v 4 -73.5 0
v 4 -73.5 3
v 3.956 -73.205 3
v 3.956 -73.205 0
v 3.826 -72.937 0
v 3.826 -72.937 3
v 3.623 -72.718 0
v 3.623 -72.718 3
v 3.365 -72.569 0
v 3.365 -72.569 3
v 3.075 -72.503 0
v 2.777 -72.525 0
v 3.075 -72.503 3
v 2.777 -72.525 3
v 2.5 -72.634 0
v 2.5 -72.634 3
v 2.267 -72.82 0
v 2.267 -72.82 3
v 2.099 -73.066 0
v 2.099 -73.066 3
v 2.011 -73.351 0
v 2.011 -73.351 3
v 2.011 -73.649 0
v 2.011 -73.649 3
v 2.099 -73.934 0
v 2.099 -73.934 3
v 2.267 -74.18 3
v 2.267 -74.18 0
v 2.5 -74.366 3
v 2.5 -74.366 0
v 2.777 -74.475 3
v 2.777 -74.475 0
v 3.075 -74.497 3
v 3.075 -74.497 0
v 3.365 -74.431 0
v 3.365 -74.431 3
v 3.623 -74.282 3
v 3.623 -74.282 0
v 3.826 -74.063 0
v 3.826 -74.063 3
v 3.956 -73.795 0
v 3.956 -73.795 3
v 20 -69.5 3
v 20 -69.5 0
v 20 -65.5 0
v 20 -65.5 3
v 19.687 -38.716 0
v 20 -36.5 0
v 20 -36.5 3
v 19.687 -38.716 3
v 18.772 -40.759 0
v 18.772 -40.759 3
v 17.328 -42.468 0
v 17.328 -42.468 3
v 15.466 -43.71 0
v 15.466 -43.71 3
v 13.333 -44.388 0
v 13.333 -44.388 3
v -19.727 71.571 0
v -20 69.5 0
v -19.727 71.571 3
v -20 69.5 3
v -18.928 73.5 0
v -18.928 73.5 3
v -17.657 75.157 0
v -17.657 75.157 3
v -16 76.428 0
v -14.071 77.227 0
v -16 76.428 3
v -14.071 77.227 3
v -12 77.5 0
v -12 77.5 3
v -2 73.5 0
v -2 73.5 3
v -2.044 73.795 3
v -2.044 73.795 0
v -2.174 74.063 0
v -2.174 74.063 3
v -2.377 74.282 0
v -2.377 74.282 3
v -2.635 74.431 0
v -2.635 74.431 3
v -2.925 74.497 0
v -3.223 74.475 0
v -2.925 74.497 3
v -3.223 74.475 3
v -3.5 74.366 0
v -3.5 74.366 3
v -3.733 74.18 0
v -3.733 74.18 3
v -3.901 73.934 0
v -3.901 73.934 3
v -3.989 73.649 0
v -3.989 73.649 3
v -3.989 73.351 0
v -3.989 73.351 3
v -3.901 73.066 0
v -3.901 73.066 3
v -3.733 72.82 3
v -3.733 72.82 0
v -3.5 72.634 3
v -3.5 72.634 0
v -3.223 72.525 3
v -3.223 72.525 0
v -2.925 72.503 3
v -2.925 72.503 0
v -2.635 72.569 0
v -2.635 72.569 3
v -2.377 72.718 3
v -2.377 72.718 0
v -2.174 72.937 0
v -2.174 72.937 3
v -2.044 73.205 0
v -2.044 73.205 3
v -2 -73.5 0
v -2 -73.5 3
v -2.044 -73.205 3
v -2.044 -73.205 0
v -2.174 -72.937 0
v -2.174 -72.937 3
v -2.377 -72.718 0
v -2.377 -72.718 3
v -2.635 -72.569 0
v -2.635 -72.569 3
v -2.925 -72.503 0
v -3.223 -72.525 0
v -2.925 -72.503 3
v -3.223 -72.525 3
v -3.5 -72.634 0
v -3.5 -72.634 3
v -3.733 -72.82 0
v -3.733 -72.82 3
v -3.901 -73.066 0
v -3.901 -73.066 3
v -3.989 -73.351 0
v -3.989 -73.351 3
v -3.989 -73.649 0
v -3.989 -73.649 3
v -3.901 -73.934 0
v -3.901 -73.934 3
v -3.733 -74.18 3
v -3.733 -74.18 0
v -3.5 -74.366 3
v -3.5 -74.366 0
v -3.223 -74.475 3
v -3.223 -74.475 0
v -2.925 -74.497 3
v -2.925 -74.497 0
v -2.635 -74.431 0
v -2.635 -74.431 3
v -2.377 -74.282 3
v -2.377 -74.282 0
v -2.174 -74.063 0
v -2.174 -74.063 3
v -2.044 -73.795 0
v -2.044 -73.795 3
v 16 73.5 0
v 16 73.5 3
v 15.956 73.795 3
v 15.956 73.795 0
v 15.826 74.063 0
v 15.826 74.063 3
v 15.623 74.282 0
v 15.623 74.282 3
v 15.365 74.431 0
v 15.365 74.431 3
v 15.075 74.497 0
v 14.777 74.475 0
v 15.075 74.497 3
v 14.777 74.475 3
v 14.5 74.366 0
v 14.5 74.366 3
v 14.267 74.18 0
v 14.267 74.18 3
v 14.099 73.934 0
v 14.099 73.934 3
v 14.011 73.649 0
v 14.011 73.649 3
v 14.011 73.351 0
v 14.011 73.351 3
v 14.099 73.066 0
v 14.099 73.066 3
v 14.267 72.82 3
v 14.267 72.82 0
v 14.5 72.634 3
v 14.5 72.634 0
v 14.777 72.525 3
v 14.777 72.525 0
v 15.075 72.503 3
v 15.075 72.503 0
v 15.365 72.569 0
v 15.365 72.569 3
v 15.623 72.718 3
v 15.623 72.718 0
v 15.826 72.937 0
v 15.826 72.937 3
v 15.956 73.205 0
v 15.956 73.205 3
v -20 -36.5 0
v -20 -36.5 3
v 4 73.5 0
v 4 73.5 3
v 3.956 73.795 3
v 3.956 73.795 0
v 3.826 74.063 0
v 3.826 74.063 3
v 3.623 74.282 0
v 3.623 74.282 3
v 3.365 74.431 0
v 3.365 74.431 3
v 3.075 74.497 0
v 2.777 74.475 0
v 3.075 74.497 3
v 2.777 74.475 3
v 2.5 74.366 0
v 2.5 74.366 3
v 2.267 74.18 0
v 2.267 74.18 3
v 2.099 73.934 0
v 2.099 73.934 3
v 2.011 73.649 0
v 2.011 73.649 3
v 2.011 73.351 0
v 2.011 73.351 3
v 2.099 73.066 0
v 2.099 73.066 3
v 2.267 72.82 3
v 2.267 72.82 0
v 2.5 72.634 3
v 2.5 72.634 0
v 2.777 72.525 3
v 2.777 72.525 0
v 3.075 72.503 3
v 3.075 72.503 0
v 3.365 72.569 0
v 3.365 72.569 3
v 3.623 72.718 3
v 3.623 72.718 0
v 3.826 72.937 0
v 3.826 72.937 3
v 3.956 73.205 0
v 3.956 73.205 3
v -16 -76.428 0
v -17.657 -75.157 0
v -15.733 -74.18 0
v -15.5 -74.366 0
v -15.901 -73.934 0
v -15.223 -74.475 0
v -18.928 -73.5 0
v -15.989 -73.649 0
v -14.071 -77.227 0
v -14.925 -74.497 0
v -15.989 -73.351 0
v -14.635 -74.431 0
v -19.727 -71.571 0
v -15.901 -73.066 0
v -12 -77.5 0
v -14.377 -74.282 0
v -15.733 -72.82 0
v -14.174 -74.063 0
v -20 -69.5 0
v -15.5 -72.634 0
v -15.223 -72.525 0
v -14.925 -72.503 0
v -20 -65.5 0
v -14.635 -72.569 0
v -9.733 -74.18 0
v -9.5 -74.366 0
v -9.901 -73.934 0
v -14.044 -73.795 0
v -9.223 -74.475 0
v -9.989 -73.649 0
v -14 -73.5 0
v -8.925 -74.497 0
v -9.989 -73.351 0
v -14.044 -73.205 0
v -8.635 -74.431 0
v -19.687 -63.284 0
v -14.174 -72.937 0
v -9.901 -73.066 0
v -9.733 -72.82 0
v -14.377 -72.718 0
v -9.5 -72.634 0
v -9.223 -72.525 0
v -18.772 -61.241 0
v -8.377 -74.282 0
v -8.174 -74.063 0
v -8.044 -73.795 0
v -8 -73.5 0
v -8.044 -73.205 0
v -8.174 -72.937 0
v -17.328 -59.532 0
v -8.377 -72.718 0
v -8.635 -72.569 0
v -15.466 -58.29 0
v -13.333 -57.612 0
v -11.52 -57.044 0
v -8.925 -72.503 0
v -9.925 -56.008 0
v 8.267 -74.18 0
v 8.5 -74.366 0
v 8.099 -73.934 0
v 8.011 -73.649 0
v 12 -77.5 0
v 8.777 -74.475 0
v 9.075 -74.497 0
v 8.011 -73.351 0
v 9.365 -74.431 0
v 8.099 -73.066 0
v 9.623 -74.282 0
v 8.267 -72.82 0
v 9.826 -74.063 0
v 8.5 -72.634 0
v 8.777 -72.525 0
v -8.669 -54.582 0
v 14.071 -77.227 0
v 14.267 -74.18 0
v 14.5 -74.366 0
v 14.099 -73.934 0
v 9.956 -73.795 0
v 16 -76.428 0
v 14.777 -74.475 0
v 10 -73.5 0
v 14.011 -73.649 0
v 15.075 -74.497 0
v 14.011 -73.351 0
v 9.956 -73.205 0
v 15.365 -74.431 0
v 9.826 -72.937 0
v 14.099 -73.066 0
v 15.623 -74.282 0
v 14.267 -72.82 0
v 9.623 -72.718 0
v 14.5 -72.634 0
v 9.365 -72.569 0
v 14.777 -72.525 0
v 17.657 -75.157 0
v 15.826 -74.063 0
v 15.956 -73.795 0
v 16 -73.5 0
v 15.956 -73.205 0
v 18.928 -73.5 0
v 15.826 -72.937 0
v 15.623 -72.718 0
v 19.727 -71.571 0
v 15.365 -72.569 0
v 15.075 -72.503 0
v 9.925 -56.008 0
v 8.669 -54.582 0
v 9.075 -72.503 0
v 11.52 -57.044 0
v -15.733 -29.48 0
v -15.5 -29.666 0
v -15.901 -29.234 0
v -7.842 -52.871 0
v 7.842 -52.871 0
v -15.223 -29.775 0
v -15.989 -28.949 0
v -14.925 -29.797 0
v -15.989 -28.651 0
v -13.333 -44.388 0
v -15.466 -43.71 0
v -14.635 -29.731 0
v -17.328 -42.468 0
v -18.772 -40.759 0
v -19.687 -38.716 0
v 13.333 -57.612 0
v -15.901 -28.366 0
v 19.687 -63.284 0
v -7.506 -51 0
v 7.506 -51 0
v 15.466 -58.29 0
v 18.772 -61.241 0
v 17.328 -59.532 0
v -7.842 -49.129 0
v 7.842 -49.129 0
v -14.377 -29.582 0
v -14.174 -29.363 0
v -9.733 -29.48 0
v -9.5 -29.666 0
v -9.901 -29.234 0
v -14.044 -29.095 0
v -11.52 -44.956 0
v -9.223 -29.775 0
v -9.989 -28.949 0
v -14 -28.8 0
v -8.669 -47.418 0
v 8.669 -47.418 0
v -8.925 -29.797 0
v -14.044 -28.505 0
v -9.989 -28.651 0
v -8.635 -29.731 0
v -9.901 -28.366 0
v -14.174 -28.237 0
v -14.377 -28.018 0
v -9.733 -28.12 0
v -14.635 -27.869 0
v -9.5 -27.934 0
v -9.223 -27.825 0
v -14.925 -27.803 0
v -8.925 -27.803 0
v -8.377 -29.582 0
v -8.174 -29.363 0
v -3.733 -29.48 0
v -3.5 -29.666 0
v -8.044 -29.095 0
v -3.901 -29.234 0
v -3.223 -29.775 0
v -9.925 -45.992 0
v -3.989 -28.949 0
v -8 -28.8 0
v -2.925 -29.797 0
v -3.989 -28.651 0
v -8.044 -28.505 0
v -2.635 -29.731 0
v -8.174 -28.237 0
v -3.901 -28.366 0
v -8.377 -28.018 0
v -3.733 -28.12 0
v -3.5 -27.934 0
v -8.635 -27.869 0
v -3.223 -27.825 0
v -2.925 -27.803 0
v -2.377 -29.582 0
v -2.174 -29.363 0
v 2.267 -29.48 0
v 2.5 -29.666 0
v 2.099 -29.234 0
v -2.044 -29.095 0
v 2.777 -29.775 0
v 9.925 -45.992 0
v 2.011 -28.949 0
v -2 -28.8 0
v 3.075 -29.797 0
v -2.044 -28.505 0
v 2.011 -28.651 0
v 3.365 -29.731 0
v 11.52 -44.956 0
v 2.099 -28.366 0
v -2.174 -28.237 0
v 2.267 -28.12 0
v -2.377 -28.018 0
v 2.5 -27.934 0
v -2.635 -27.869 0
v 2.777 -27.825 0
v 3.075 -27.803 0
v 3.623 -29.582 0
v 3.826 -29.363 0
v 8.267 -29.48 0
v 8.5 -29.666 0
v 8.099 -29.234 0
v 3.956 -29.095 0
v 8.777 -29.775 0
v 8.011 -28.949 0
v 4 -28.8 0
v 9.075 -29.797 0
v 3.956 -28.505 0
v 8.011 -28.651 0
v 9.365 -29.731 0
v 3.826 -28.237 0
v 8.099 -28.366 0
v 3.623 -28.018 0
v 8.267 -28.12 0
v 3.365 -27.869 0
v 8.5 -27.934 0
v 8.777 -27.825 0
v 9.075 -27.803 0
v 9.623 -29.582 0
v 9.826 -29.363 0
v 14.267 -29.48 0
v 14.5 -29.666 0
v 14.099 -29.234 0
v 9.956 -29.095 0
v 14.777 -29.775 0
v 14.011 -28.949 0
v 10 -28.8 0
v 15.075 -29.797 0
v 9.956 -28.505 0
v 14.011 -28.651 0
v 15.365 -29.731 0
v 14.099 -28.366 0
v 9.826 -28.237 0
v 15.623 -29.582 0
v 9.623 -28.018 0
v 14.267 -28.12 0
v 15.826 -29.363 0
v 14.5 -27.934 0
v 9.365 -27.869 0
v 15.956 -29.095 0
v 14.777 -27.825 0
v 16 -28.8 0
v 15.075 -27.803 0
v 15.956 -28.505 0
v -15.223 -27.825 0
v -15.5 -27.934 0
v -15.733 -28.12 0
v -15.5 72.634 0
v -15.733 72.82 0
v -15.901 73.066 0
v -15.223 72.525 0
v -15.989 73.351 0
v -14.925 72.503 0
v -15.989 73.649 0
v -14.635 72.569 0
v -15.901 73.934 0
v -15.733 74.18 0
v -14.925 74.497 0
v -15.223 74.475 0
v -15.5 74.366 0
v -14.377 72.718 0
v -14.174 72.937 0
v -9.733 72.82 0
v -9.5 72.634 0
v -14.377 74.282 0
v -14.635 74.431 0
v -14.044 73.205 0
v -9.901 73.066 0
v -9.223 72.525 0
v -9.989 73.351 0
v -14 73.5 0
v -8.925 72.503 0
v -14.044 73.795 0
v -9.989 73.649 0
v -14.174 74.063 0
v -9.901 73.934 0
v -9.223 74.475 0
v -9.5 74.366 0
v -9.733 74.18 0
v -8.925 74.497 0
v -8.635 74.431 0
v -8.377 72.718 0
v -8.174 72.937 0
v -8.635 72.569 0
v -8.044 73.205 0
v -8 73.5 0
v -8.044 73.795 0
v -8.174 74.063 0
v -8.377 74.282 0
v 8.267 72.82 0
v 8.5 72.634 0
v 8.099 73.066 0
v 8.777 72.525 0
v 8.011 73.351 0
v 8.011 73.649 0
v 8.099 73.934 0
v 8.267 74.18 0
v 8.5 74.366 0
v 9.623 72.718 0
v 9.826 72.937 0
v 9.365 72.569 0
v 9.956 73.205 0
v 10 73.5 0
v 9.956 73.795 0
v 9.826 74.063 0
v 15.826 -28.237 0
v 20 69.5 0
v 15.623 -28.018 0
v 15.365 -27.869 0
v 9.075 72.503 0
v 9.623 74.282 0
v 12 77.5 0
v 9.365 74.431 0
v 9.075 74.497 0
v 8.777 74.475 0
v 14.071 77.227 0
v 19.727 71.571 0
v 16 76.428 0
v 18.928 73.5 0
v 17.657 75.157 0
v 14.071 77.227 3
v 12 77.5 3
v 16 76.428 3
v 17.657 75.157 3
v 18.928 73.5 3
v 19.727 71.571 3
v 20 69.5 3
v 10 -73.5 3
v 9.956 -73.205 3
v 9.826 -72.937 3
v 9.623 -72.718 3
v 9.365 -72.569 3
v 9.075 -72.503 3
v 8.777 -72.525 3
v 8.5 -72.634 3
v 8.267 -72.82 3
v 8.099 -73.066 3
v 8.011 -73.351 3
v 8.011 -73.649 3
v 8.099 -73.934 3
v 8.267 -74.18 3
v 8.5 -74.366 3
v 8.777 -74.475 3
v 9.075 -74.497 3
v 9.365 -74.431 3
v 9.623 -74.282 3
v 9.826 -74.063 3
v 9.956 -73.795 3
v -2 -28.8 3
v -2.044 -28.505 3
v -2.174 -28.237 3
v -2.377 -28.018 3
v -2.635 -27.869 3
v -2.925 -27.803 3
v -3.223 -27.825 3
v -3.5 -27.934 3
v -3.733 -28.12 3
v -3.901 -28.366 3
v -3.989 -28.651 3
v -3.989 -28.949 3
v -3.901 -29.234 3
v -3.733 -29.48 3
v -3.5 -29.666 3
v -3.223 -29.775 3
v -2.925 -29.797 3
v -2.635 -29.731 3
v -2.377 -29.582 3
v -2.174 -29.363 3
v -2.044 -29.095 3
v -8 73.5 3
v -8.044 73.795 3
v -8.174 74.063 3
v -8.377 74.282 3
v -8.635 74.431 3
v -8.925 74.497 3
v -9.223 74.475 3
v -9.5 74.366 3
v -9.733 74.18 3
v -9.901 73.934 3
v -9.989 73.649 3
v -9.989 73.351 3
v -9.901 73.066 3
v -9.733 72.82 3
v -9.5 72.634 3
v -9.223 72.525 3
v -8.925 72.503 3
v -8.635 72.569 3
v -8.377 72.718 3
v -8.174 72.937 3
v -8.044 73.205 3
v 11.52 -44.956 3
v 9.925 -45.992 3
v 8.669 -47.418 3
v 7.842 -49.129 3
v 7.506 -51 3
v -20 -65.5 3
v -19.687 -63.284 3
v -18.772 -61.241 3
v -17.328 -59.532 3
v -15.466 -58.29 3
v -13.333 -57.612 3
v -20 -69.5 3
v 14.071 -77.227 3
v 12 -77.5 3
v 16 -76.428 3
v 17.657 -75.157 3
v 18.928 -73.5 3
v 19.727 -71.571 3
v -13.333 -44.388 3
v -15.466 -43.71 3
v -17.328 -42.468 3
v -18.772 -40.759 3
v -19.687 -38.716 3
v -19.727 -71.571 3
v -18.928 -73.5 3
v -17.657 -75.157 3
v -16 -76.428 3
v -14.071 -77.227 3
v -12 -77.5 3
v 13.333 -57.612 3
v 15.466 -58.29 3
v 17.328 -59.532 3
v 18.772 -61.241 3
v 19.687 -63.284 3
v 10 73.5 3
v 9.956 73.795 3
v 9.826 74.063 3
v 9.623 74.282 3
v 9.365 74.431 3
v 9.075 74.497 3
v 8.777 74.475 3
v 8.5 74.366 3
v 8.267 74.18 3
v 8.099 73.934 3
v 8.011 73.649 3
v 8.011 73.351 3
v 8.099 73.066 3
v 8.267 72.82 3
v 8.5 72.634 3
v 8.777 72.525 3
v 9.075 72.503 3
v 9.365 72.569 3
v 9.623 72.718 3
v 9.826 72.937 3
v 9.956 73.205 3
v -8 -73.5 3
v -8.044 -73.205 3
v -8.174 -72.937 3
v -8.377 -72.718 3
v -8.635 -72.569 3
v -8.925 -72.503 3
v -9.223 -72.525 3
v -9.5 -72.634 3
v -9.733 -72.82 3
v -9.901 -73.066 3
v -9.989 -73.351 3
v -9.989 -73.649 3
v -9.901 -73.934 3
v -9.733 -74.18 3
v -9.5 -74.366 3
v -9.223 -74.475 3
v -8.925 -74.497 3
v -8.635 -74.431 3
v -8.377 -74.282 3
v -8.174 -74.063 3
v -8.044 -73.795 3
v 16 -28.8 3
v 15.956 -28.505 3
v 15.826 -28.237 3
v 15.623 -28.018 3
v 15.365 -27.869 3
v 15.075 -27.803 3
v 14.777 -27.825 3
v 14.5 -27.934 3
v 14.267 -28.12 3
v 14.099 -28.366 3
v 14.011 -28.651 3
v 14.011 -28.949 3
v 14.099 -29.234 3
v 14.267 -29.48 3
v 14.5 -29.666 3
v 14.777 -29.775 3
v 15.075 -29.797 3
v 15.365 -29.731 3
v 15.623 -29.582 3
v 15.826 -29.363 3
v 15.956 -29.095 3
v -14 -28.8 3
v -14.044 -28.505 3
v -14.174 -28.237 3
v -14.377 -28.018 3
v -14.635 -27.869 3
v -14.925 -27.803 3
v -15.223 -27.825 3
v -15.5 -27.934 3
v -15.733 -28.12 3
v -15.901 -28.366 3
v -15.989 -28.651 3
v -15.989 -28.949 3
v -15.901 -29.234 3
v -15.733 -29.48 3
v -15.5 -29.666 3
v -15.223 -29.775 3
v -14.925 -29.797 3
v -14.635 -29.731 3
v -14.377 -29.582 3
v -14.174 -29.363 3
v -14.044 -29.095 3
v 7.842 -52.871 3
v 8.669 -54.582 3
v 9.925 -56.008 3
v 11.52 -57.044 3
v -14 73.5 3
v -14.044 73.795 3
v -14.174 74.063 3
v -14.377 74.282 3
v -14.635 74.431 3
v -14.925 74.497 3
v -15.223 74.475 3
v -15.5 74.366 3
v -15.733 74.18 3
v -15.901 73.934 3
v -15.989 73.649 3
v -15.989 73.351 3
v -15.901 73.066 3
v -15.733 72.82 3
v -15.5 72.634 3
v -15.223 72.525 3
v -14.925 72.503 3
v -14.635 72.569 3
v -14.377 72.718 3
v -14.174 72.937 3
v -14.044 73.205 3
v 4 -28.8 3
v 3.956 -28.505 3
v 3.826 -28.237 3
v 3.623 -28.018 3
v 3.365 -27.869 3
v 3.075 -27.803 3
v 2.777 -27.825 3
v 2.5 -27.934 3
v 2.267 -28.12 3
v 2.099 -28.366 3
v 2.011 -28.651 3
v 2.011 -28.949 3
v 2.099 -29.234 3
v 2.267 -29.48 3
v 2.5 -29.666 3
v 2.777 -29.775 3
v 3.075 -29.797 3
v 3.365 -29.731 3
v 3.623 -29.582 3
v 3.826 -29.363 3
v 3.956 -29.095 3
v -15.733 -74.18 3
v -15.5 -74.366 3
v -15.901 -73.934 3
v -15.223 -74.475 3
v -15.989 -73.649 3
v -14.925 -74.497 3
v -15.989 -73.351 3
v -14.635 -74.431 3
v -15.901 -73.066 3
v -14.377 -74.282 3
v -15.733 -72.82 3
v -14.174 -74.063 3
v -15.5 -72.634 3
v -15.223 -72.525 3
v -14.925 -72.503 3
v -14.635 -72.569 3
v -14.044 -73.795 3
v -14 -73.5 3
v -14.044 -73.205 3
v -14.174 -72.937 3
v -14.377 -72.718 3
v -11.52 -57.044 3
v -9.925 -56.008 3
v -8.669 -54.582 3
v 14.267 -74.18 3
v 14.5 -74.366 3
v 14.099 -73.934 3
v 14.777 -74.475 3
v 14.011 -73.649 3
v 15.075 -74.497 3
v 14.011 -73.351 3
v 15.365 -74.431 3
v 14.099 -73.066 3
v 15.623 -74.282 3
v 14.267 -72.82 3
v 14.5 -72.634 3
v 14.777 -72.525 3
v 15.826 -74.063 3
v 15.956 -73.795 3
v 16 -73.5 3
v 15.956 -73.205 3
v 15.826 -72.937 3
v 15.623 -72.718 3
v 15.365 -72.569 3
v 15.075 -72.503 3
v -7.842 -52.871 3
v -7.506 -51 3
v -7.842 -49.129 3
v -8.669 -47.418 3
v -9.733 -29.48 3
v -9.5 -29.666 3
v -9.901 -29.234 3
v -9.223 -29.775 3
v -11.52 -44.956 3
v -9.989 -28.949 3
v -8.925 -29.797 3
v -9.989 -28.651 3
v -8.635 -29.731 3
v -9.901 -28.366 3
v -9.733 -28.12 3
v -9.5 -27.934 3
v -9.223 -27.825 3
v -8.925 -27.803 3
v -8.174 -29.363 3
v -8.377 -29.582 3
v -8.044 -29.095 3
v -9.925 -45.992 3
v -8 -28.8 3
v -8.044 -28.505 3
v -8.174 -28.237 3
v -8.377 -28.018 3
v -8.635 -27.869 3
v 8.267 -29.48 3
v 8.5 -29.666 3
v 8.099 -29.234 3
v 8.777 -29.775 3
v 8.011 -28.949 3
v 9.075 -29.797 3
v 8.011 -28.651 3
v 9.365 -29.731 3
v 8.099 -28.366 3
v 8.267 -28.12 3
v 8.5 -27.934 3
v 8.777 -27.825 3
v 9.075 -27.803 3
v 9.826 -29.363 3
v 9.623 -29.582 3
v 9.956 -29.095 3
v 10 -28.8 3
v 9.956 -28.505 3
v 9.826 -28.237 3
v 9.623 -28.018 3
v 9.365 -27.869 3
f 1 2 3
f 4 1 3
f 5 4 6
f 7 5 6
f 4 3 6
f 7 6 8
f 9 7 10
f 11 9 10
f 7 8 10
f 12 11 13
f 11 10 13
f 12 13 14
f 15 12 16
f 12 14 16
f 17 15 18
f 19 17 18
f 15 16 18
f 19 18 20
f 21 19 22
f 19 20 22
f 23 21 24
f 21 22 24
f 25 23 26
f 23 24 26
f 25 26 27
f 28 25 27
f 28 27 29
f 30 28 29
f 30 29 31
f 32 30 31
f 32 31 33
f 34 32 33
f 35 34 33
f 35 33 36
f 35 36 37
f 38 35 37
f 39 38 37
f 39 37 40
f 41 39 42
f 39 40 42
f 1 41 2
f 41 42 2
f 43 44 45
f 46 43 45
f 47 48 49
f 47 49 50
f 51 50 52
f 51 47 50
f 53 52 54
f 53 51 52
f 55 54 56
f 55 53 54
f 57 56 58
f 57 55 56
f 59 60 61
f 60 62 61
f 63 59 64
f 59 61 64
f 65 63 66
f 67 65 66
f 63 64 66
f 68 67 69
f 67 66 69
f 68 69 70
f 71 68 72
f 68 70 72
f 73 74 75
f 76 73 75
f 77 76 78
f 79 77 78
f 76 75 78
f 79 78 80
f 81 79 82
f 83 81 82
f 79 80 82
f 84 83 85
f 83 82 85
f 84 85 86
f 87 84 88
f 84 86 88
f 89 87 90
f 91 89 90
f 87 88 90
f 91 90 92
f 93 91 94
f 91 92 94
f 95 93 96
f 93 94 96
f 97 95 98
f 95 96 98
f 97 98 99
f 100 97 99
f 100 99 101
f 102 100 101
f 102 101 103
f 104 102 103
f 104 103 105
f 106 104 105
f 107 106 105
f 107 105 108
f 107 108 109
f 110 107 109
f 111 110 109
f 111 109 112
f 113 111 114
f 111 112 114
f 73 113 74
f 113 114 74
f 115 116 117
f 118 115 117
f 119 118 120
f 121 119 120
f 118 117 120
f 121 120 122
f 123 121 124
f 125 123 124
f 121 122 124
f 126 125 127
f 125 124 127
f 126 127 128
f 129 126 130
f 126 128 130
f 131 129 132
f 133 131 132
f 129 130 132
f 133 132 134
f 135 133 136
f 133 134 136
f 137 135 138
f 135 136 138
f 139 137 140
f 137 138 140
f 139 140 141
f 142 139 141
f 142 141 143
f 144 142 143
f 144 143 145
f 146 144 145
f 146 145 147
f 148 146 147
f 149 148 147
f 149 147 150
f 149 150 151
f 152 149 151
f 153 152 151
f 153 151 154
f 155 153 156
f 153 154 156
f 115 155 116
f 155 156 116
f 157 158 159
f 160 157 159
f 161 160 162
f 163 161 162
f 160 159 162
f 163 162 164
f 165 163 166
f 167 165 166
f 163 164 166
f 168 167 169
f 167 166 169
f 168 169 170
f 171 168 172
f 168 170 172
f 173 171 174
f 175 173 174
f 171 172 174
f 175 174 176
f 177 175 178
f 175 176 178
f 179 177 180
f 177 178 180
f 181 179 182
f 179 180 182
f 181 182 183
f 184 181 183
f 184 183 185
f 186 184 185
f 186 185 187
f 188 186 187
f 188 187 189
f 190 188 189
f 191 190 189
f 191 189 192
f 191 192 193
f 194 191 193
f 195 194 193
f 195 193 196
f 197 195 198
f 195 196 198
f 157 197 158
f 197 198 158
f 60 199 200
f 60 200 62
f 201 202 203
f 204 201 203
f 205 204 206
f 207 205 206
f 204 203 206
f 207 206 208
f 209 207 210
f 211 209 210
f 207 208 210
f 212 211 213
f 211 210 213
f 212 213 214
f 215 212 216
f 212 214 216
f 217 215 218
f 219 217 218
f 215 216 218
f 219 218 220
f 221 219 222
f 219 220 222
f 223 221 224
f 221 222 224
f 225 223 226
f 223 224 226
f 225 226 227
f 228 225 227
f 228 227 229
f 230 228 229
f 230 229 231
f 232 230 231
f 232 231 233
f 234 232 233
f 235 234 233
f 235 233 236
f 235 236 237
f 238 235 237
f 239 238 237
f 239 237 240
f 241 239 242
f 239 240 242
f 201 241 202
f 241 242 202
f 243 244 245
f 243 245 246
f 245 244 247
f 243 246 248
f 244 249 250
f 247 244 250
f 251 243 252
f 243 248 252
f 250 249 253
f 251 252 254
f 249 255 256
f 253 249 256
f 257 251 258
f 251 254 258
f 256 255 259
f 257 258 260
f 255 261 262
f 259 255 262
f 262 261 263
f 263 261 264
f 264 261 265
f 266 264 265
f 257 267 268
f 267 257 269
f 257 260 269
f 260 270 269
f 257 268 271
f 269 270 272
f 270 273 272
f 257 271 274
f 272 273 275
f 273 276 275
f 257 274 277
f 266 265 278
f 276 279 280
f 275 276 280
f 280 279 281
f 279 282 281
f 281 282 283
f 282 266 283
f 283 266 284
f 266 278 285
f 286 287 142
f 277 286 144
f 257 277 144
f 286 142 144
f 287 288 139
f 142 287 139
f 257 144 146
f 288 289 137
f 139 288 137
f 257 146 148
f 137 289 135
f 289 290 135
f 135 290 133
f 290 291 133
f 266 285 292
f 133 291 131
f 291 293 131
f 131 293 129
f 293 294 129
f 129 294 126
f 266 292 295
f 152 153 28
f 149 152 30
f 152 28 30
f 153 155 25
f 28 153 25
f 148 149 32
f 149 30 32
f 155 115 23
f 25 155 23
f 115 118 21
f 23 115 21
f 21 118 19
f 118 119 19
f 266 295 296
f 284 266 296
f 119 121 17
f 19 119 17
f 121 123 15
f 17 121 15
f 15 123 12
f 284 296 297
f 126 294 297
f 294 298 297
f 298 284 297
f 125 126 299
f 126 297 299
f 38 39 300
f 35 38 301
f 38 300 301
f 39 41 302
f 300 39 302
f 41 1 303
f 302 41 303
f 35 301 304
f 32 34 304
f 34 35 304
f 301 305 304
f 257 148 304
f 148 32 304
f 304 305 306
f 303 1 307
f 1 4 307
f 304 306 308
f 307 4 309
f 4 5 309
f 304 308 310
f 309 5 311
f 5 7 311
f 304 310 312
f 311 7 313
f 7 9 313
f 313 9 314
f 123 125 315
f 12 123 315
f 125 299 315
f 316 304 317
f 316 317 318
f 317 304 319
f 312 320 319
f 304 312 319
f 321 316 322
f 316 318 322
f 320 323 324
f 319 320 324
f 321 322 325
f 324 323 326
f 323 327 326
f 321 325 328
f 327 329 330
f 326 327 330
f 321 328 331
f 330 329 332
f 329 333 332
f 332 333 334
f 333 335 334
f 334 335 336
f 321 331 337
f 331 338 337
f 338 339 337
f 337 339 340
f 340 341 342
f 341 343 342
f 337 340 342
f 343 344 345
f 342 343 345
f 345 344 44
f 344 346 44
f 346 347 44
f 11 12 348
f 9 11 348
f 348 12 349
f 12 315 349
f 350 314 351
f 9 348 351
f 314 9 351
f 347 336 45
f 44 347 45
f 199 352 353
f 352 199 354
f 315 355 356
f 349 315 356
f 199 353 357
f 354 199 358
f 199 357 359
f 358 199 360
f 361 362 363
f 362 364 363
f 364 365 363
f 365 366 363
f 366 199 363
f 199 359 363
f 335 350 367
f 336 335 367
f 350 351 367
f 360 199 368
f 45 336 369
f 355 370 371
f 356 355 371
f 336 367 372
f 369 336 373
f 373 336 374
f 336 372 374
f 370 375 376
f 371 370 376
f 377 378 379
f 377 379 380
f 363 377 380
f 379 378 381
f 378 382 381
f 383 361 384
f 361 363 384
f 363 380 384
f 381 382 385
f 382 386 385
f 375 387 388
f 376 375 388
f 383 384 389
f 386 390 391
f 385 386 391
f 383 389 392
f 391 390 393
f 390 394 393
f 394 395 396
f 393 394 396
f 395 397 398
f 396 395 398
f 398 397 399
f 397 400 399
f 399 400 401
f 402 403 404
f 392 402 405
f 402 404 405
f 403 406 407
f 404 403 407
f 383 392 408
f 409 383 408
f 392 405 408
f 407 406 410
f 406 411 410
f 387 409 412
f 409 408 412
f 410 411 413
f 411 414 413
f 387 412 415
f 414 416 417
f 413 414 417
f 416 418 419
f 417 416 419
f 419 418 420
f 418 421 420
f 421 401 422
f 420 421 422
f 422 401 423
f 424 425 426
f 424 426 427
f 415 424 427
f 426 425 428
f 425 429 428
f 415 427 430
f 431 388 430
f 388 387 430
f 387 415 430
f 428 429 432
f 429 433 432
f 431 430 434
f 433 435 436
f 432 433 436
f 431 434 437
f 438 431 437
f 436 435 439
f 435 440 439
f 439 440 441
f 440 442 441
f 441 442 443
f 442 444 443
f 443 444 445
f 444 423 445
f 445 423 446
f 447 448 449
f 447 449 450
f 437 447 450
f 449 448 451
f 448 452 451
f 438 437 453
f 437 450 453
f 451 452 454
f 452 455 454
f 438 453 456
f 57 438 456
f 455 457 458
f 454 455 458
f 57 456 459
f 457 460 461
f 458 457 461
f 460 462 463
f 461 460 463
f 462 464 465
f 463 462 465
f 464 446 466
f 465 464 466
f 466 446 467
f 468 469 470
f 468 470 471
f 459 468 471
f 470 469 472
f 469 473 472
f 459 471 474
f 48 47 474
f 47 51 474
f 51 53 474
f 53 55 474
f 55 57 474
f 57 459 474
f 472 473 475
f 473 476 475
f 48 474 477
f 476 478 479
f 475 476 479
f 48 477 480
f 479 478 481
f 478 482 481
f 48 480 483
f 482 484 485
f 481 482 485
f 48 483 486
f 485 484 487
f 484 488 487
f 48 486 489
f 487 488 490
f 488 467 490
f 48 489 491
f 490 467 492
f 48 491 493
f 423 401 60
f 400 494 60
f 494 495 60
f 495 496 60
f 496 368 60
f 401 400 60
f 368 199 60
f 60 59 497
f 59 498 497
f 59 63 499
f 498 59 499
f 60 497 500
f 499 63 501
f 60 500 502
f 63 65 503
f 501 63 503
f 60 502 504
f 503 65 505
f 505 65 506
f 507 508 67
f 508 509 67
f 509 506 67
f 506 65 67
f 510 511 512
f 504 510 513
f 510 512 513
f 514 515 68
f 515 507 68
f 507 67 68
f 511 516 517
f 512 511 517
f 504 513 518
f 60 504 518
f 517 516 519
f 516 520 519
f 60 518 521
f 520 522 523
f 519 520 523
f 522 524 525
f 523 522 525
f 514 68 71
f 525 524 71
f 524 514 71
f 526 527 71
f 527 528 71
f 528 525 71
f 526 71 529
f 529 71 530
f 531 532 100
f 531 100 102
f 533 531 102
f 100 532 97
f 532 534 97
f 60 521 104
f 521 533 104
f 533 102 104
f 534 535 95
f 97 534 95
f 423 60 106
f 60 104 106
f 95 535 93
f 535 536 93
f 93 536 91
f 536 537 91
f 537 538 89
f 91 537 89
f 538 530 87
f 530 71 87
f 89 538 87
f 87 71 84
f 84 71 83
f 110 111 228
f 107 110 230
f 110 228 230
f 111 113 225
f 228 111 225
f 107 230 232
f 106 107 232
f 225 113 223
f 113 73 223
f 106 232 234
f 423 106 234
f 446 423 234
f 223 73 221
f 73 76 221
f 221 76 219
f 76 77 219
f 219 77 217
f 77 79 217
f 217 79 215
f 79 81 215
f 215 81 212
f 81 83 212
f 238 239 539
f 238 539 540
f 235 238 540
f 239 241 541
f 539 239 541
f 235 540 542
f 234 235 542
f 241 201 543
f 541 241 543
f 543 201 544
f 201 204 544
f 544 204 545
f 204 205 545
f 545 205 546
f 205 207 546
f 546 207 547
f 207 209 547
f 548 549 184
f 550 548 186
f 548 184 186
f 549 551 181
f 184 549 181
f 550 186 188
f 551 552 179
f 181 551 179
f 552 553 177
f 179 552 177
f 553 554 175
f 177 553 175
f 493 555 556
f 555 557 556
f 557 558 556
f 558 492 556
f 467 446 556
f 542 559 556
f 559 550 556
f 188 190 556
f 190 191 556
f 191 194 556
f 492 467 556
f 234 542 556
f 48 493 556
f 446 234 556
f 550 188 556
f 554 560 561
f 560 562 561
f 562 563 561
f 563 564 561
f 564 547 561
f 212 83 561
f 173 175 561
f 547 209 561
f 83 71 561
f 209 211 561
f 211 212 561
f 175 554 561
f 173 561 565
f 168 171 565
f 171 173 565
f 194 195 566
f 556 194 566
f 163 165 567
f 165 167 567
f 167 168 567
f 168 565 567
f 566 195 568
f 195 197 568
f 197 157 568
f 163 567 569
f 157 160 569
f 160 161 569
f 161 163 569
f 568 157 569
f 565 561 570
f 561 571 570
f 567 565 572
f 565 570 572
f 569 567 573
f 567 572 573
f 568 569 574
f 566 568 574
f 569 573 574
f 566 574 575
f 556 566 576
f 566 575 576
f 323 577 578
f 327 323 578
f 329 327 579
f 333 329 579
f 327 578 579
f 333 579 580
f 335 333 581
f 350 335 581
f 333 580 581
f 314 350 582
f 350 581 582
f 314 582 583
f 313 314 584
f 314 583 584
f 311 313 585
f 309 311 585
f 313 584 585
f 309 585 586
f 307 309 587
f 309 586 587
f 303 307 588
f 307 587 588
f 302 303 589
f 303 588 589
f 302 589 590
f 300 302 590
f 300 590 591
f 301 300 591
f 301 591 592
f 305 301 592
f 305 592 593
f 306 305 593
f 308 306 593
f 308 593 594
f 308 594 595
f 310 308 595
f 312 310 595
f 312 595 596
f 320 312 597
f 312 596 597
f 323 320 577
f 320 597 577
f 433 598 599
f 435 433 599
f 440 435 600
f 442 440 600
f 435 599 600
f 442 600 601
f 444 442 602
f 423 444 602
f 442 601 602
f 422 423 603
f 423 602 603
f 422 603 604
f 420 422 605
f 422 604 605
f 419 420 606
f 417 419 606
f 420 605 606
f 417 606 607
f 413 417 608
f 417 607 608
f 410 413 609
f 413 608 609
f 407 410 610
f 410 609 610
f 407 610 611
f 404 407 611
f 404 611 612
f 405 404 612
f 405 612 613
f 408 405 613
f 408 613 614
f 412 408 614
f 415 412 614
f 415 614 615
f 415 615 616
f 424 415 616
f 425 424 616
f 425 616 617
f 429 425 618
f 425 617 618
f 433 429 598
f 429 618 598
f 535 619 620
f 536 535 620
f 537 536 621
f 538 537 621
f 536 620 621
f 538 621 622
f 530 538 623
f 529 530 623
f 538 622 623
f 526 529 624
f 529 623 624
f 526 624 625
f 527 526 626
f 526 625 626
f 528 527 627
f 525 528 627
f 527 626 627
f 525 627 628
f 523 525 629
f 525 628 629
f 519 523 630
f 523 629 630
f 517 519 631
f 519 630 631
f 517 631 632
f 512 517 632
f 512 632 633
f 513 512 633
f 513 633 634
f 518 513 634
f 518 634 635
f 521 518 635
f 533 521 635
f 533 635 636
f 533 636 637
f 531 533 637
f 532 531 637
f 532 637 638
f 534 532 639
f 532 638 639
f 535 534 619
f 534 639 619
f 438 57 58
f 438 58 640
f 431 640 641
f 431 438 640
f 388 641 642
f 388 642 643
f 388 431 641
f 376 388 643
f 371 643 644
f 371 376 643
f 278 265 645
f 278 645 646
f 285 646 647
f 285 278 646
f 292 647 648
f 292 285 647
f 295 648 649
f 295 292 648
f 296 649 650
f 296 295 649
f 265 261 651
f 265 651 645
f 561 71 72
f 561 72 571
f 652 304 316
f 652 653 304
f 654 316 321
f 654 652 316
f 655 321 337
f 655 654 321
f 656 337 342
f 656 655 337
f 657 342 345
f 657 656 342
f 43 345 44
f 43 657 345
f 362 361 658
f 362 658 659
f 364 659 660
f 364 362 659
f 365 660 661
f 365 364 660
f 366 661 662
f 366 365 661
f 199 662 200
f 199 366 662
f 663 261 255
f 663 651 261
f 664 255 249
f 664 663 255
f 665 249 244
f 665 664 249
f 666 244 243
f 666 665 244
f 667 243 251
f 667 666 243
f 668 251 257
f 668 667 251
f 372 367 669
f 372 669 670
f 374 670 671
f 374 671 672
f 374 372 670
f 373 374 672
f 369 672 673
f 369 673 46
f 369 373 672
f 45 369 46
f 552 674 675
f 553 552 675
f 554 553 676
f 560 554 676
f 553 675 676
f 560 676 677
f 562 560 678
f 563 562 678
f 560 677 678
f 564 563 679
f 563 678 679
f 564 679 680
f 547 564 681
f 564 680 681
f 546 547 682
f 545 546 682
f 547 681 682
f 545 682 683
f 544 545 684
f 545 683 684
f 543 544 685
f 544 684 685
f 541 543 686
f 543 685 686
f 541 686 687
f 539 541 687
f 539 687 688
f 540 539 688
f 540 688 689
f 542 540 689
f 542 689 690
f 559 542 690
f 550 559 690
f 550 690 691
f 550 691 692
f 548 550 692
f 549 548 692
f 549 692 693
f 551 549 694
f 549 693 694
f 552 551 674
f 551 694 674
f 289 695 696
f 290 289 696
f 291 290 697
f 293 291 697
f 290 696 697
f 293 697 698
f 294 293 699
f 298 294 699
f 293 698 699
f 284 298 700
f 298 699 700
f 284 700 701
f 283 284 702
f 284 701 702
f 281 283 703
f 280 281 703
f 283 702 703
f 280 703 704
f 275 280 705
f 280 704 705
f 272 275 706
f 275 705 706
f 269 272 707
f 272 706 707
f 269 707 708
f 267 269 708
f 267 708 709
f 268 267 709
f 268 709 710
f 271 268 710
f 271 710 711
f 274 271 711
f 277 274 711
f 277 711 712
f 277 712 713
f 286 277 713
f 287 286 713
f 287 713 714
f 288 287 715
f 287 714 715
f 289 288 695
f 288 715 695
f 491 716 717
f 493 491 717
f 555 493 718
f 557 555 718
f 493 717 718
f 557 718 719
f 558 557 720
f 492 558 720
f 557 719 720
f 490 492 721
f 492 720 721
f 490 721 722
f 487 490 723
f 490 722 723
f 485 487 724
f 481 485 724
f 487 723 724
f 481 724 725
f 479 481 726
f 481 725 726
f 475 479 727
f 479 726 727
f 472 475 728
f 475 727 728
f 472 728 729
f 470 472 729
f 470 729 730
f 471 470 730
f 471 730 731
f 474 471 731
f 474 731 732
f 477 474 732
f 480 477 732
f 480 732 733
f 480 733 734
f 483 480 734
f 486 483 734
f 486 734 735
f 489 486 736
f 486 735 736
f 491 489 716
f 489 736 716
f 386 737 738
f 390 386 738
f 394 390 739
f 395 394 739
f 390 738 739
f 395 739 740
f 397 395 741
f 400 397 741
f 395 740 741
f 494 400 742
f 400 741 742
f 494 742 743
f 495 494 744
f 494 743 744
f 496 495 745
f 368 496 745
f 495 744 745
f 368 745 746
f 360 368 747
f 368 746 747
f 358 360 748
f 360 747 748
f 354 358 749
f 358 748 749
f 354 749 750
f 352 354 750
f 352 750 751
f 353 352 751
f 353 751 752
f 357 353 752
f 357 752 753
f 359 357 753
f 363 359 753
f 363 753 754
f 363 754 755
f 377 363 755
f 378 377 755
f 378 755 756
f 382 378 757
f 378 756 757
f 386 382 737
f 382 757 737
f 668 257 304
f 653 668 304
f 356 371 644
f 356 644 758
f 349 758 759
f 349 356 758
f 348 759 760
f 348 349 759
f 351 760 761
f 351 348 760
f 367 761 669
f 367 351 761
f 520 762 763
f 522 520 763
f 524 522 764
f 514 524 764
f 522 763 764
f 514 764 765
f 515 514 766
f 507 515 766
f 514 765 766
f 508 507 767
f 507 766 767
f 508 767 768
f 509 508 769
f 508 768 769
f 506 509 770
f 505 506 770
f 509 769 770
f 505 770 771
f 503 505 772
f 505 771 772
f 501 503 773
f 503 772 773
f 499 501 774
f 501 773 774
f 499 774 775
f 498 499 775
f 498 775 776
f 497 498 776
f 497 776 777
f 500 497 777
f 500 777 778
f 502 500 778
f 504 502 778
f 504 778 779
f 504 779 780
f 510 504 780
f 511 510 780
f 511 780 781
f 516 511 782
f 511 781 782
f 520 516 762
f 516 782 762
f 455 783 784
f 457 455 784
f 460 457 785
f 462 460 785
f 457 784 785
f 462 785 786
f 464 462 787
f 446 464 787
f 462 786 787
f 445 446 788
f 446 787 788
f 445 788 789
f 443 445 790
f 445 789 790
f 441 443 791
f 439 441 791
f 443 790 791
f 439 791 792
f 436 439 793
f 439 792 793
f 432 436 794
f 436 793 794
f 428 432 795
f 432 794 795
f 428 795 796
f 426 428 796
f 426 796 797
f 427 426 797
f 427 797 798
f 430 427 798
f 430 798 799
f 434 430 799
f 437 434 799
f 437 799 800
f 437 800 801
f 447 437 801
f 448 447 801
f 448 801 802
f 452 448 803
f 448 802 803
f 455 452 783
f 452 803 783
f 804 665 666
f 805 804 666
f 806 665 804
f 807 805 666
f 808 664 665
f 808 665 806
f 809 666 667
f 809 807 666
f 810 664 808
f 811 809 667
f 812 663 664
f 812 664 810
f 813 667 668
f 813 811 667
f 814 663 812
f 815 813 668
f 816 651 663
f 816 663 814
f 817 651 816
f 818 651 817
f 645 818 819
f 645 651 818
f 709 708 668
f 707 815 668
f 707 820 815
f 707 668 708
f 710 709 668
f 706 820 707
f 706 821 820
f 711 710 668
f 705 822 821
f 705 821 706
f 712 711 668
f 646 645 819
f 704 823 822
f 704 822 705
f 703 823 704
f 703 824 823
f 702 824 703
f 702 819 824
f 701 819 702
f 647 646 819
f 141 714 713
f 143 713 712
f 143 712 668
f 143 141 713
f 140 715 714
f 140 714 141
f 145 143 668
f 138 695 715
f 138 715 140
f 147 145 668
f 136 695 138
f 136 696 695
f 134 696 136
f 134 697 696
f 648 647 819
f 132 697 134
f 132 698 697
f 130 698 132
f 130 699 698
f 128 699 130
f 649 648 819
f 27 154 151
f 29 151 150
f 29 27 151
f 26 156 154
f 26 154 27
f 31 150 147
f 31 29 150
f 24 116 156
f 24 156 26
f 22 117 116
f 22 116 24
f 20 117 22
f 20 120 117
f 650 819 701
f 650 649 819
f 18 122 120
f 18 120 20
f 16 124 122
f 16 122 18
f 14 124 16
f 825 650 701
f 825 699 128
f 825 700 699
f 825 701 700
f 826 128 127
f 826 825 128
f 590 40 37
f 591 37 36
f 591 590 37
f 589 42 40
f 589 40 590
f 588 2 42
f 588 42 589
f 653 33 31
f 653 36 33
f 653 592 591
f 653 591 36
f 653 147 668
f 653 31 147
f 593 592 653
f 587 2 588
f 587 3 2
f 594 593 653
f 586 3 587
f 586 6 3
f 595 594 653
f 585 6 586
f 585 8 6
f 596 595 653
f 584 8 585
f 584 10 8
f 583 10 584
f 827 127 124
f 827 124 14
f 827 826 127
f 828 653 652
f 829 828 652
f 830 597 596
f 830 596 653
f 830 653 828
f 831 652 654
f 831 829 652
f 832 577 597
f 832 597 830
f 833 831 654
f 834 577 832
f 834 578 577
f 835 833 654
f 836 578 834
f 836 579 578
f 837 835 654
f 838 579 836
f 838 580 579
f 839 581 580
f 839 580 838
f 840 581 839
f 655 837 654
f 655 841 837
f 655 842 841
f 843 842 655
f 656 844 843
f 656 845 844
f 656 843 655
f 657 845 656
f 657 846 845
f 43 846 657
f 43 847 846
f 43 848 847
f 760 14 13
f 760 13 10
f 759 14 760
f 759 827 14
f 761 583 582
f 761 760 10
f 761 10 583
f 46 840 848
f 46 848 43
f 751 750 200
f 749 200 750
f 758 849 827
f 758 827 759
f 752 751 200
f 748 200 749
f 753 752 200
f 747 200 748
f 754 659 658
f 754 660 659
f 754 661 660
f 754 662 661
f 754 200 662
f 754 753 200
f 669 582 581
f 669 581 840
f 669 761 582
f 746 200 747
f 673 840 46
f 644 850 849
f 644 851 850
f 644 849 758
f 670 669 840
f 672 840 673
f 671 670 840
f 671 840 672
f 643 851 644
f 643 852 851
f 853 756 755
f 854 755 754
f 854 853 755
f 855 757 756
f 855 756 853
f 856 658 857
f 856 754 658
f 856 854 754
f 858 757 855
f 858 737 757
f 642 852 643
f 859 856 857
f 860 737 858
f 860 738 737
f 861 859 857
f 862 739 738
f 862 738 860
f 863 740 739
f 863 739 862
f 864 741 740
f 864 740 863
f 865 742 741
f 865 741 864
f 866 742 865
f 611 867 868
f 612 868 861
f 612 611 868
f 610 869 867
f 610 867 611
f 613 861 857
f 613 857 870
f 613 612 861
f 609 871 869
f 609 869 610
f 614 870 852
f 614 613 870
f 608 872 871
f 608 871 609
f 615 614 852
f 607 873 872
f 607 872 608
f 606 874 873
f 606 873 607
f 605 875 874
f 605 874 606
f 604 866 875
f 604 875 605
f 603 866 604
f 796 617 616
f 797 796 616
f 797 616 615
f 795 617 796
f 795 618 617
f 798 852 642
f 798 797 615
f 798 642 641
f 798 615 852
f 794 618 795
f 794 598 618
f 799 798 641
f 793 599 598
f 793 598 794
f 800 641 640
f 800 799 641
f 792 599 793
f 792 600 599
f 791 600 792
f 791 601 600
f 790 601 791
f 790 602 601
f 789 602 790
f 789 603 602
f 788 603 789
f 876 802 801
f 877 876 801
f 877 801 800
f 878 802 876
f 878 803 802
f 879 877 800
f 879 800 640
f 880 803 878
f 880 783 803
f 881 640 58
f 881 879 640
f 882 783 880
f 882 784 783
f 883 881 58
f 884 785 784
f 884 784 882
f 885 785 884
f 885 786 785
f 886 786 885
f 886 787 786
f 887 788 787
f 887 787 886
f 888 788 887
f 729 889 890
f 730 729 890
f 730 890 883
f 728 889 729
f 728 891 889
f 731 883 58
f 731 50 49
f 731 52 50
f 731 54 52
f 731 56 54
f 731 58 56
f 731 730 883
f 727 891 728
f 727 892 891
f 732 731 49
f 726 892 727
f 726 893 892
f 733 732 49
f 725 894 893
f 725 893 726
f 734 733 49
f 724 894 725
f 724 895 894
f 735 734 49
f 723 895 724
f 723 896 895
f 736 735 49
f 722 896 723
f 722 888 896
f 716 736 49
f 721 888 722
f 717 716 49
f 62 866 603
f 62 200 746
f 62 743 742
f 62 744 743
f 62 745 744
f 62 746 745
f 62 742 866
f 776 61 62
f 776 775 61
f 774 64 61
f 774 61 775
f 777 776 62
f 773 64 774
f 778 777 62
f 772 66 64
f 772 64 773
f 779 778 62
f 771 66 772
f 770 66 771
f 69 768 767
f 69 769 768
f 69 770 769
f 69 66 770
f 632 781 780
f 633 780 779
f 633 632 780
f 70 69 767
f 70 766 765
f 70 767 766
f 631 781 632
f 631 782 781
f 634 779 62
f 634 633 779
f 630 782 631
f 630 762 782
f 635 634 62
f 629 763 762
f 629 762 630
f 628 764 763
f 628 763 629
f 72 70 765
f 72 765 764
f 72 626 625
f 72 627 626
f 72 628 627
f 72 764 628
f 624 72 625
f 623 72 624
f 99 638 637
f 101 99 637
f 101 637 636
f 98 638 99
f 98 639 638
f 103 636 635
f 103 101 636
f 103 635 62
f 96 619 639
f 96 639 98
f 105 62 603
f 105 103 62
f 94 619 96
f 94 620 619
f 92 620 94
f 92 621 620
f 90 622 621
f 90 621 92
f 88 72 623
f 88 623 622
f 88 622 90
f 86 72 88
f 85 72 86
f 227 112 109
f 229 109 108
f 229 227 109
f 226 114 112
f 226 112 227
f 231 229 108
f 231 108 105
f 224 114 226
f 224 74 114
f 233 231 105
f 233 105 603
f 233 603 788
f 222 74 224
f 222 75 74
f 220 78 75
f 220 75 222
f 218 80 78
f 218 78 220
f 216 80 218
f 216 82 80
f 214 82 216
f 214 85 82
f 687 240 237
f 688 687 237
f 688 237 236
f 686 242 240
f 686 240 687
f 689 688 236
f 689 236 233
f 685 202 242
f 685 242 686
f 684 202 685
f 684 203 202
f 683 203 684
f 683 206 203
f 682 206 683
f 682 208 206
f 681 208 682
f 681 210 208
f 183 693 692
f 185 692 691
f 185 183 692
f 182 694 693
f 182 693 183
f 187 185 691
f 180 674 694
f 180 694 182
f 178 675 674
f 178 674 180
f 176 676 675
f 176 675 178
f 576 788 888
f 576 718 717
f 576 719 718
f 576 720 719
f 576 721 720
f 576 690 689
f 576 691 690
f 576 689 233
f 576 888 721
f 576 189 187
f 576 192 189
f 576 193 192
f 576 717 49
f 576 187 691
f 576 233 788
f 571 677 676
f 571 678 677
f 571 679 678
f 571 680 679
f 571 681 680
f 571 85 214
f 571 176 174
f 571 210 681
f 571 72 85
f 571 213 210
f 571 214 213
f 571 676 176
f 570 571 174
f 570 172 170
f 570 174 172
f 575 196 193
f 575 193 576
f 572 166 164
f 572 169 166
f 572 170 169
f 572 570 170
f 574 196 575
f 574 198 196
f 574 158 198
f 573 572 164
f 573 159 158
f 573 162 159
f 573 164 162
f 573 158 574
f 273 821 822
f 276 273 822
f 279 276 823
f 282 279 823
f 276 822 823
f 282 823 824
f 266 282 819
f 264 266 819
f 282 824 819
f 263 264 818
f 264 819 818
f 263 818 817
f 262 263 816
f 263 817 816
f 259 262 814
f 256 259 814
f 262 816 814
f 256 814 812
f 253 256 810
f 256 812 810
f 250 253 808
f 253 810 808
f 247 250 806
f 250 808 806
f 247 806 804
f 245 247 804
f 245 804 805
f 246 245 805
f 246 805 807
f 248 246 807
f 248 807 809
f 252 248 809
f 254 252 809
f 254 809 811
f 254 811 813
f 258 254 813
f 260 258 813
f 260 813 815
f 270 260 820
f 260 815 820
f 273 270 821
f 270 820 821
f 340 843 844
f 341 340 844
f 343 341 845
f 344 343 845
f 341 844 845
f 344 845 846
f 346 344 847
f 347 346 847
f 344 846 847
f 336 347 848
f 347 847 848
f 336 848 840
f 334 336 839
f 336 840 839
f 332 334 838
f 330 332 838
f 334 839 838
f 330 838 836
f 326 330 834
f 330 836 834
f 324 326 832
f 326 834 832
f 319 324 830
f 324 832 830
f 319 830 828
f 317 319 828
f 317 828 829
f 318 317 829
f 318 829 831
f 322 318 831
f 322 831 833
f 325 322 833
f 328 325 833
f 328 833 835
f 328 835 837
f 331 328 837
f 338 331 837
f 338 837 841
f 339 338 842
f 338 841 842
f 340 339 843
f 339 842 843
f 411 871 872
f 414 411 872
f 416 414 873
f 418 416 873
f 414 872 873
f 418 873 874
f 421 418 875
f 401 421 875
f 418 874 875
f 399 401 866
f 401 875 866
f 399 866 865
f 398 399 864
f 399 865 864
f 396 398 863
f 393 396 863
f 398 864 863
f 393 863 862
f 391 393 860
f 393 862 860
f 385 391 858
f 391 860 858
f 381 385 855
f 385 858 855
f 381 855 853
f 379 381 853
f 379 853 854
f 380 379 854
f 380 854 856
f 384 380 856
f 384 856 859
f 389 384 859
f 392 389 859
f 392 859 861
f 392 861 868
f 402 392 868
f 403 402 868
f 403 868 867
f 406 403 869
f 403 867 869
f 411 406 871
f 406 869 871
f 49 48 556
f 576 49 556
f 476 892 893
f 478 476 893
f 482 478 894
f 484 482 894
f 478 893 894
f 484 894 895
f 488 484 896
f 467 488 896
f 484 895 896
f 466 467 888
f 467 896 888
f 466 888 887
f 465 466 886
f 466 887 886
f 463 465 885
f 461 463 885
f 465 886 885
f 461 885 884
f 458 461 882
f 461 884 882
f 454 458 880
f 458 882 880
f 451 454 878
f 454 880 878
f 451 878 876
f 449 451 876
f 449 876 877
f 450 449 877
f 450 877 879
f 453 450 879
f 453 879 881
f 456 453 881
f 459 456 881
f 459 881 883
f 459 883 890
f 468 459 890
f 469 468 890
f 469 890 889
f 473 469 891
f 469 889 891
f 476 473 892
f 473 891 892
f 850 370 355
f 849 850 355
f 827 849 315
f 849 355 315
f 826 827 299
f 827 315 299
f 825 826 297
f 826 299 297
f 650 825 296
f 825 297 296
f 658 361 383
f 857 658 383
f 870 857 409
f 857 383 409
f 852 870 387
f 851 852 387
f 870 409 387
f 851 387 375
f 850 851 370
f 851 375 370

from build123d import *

# Parameters (mm, degrees)
F0_W        = 40
F0_H        = 155
F1_DEPTH    = 3
F2_W        = 12.5
F2_H        = 13
F3_DEPTH    = 3
F4_R        = 8
F5_T1_DEPTH = 3
F6_R        = 1
F7_DEPTH    = 3


# Not quite as in the source:
# - a fillet or chamfer that OpenCascade refuses, or shapes differently, is made with other operations: its cross-section is extruded or revolved along the edge and cut away or added


with BuildPart() as f1:
    # F0 (on Top) → F1 (new body)
    with BuildSketch(Plane.XY):
        Rectangle(F0_W, F0_H)
    extrude(amount=F1_DEPTH)

    # F2 (on face) → F3 (cut, through all)
    with BuildSketch(Plane.XY.offset(3)):
        with Locations((-13.75, -51)):
            Rectangle(F2_W, F2_H)
        with Locations((13.75, -51)):
            Rectangle(F2_W, F2_H)
    extrude(amount=-F3_DEPTH, mode=Mode.SUBTRACT)

    # F4
    f4_edges = [f1.edges().sort_by_distance(p)[0] for p in [
        (-20, -44.5, 1.5),
        (20, -44.5, 1.5),
        (20, -57.5, 1.5),
        (-20, -57.5, 1.5),
        (-20, -77.5, 1.5),
        (20, -77.5, 1.5),
        (-20, 77.5, 1.5),
        (20, 77.5, 1.5),
    ]]
    fillet(f4_edges, radius=F4_R)

    # F5: fillet of radius 7 on 4 edges, made by hand

    # F5_s2 → F5_t1 (join)
    with BuildSketch(Plane.XY):
        with BuildLine():
            ThreePointArc((-13.3333333333, -44.3881063775), (-9.1536616892, -46.7717188872), (-7.5, -51.2901994578))
            Line((-7.5, -51.2901994578), (-6.8, -51.2901994578))
            Line((-6.8, -51.2901994578), (-6.8, -44.5))
            Line((-6.8, -44.5), (-7.5, -43.8))
            ThreePointArc((-7.5, -43.8), (-12, -43.8), (-13.2166666667, -43.6978970694))
            Line((-13.2166666667, -43.6978970694), (-13.3333333333, -44.3881063775))
        make_face()
        with BuildLine():
            ThreePointArc((-7.5, -50.7098005422), (-9.1536616892, -55.2282811128), (-13.3333333333, -57.6118936225))
            Line((-13.3333333333, -57.6118936225), (-13.2166666667, -58.3021029306))
            ThreePointArc((-13.2166666667, -58.3021029306), (-12, -58.2), (-7.5, -58.2))
            Line((-7.5, -58.2), (-6.8, -57.5))
            Line((-6.8, -57.5), (-6.8, -50.7098005422))
            Line((-6.8, -50.7098005422), (-7.5, -50.7098005422))
        make_face()
        with BuildLine():
            ThreePointArc((13.3333333333, -44.3881063775), (9.1536616892, -46.7717188872), (7.5, -51.2901994578))
            Line((7.5, -51.2901994578), (6.8, -51.2901994578))
            Line((6.8, -51.2901994578), (6.8, -44.5))
            Line((6.8, -44.5), (7.5, -43.8))
            ThreePointArc((7.5, -43.8), (12, -43.8), (13.2166666667, -43.6978970694))
            Line((13.2166666667, -43.6978970694), (13.3333333333, -44.3881063775))
        make_face()
        with BuildLine():
            ThreePointArc((7.5, -50.7098005422), (9.1536616892, -55.2282811128), (13.3333333333, -57.6118936225))
            Line((13.3333333333, -57.6118936225), (13.2166666667, -58.3021029306))
            ThreePointArc((13.2166666667, -58.3021029306), (12, -58.2), (7.5, -58.2))
            Line((7.5, -58.2), (6.8, -57.5))
            Line((6.8, -57.5), (6.8, -50.7098005422))
            Line((6.8, -50.7098005422), (7.5, -50.7098005422))
        make_face()
    extrude(amount=F5_T1_DEPTH)

    # F6 (on face) → F7 (cut, through all)
    with BuildSketch(Plane.XY.offset(3)):
        with Locations((-15, -73.5)):
            Circle(F6_R)
        with Locations((-9, -73.5)):
            Circle(F6_R)
        with Locations((-3, -73.5)):
            Circle(F6_R)
        with Locations((3, -73.5)):
            Circle(F6_R)
        with Locations((-15, -28.8)):
            Circle(F6_R)
        with Locations((-9, -28.8)):
            Circle(F6_R)
        with Locations((-3, -28.8)):
            Circle(F6_R)
        with Locations((3, -28.8)):
            Circle(F6_R)
        with Locations((-15, 73.5)):
            Circle(F6_R)
        with Locations((-9, 73.5)):
            Circle(F6_R)
        with Locations((-3, 73.5)):
            Circle(F6_R)
        with Locations((3, 73.5)):
            Circle(F6_R)
        with Locations((9, -73.5)):
            Circle(F6_R)
        with Locations((15, -73.5)):
            Circle(F6_R)
        with Locations((9, -28.8)):
            Circle(F6_R)
        with Locations((15, -28.8)):
            Circle(F6_R)
        with Locations((9, 73.5)):
            Circle(F6_R)
        with Locations((15, 73.5)):
            Circle(F6_R)
    extrude(amount=-F7_DEPTH, mode=Mode.SUBTRACT)


solid = f1.part
